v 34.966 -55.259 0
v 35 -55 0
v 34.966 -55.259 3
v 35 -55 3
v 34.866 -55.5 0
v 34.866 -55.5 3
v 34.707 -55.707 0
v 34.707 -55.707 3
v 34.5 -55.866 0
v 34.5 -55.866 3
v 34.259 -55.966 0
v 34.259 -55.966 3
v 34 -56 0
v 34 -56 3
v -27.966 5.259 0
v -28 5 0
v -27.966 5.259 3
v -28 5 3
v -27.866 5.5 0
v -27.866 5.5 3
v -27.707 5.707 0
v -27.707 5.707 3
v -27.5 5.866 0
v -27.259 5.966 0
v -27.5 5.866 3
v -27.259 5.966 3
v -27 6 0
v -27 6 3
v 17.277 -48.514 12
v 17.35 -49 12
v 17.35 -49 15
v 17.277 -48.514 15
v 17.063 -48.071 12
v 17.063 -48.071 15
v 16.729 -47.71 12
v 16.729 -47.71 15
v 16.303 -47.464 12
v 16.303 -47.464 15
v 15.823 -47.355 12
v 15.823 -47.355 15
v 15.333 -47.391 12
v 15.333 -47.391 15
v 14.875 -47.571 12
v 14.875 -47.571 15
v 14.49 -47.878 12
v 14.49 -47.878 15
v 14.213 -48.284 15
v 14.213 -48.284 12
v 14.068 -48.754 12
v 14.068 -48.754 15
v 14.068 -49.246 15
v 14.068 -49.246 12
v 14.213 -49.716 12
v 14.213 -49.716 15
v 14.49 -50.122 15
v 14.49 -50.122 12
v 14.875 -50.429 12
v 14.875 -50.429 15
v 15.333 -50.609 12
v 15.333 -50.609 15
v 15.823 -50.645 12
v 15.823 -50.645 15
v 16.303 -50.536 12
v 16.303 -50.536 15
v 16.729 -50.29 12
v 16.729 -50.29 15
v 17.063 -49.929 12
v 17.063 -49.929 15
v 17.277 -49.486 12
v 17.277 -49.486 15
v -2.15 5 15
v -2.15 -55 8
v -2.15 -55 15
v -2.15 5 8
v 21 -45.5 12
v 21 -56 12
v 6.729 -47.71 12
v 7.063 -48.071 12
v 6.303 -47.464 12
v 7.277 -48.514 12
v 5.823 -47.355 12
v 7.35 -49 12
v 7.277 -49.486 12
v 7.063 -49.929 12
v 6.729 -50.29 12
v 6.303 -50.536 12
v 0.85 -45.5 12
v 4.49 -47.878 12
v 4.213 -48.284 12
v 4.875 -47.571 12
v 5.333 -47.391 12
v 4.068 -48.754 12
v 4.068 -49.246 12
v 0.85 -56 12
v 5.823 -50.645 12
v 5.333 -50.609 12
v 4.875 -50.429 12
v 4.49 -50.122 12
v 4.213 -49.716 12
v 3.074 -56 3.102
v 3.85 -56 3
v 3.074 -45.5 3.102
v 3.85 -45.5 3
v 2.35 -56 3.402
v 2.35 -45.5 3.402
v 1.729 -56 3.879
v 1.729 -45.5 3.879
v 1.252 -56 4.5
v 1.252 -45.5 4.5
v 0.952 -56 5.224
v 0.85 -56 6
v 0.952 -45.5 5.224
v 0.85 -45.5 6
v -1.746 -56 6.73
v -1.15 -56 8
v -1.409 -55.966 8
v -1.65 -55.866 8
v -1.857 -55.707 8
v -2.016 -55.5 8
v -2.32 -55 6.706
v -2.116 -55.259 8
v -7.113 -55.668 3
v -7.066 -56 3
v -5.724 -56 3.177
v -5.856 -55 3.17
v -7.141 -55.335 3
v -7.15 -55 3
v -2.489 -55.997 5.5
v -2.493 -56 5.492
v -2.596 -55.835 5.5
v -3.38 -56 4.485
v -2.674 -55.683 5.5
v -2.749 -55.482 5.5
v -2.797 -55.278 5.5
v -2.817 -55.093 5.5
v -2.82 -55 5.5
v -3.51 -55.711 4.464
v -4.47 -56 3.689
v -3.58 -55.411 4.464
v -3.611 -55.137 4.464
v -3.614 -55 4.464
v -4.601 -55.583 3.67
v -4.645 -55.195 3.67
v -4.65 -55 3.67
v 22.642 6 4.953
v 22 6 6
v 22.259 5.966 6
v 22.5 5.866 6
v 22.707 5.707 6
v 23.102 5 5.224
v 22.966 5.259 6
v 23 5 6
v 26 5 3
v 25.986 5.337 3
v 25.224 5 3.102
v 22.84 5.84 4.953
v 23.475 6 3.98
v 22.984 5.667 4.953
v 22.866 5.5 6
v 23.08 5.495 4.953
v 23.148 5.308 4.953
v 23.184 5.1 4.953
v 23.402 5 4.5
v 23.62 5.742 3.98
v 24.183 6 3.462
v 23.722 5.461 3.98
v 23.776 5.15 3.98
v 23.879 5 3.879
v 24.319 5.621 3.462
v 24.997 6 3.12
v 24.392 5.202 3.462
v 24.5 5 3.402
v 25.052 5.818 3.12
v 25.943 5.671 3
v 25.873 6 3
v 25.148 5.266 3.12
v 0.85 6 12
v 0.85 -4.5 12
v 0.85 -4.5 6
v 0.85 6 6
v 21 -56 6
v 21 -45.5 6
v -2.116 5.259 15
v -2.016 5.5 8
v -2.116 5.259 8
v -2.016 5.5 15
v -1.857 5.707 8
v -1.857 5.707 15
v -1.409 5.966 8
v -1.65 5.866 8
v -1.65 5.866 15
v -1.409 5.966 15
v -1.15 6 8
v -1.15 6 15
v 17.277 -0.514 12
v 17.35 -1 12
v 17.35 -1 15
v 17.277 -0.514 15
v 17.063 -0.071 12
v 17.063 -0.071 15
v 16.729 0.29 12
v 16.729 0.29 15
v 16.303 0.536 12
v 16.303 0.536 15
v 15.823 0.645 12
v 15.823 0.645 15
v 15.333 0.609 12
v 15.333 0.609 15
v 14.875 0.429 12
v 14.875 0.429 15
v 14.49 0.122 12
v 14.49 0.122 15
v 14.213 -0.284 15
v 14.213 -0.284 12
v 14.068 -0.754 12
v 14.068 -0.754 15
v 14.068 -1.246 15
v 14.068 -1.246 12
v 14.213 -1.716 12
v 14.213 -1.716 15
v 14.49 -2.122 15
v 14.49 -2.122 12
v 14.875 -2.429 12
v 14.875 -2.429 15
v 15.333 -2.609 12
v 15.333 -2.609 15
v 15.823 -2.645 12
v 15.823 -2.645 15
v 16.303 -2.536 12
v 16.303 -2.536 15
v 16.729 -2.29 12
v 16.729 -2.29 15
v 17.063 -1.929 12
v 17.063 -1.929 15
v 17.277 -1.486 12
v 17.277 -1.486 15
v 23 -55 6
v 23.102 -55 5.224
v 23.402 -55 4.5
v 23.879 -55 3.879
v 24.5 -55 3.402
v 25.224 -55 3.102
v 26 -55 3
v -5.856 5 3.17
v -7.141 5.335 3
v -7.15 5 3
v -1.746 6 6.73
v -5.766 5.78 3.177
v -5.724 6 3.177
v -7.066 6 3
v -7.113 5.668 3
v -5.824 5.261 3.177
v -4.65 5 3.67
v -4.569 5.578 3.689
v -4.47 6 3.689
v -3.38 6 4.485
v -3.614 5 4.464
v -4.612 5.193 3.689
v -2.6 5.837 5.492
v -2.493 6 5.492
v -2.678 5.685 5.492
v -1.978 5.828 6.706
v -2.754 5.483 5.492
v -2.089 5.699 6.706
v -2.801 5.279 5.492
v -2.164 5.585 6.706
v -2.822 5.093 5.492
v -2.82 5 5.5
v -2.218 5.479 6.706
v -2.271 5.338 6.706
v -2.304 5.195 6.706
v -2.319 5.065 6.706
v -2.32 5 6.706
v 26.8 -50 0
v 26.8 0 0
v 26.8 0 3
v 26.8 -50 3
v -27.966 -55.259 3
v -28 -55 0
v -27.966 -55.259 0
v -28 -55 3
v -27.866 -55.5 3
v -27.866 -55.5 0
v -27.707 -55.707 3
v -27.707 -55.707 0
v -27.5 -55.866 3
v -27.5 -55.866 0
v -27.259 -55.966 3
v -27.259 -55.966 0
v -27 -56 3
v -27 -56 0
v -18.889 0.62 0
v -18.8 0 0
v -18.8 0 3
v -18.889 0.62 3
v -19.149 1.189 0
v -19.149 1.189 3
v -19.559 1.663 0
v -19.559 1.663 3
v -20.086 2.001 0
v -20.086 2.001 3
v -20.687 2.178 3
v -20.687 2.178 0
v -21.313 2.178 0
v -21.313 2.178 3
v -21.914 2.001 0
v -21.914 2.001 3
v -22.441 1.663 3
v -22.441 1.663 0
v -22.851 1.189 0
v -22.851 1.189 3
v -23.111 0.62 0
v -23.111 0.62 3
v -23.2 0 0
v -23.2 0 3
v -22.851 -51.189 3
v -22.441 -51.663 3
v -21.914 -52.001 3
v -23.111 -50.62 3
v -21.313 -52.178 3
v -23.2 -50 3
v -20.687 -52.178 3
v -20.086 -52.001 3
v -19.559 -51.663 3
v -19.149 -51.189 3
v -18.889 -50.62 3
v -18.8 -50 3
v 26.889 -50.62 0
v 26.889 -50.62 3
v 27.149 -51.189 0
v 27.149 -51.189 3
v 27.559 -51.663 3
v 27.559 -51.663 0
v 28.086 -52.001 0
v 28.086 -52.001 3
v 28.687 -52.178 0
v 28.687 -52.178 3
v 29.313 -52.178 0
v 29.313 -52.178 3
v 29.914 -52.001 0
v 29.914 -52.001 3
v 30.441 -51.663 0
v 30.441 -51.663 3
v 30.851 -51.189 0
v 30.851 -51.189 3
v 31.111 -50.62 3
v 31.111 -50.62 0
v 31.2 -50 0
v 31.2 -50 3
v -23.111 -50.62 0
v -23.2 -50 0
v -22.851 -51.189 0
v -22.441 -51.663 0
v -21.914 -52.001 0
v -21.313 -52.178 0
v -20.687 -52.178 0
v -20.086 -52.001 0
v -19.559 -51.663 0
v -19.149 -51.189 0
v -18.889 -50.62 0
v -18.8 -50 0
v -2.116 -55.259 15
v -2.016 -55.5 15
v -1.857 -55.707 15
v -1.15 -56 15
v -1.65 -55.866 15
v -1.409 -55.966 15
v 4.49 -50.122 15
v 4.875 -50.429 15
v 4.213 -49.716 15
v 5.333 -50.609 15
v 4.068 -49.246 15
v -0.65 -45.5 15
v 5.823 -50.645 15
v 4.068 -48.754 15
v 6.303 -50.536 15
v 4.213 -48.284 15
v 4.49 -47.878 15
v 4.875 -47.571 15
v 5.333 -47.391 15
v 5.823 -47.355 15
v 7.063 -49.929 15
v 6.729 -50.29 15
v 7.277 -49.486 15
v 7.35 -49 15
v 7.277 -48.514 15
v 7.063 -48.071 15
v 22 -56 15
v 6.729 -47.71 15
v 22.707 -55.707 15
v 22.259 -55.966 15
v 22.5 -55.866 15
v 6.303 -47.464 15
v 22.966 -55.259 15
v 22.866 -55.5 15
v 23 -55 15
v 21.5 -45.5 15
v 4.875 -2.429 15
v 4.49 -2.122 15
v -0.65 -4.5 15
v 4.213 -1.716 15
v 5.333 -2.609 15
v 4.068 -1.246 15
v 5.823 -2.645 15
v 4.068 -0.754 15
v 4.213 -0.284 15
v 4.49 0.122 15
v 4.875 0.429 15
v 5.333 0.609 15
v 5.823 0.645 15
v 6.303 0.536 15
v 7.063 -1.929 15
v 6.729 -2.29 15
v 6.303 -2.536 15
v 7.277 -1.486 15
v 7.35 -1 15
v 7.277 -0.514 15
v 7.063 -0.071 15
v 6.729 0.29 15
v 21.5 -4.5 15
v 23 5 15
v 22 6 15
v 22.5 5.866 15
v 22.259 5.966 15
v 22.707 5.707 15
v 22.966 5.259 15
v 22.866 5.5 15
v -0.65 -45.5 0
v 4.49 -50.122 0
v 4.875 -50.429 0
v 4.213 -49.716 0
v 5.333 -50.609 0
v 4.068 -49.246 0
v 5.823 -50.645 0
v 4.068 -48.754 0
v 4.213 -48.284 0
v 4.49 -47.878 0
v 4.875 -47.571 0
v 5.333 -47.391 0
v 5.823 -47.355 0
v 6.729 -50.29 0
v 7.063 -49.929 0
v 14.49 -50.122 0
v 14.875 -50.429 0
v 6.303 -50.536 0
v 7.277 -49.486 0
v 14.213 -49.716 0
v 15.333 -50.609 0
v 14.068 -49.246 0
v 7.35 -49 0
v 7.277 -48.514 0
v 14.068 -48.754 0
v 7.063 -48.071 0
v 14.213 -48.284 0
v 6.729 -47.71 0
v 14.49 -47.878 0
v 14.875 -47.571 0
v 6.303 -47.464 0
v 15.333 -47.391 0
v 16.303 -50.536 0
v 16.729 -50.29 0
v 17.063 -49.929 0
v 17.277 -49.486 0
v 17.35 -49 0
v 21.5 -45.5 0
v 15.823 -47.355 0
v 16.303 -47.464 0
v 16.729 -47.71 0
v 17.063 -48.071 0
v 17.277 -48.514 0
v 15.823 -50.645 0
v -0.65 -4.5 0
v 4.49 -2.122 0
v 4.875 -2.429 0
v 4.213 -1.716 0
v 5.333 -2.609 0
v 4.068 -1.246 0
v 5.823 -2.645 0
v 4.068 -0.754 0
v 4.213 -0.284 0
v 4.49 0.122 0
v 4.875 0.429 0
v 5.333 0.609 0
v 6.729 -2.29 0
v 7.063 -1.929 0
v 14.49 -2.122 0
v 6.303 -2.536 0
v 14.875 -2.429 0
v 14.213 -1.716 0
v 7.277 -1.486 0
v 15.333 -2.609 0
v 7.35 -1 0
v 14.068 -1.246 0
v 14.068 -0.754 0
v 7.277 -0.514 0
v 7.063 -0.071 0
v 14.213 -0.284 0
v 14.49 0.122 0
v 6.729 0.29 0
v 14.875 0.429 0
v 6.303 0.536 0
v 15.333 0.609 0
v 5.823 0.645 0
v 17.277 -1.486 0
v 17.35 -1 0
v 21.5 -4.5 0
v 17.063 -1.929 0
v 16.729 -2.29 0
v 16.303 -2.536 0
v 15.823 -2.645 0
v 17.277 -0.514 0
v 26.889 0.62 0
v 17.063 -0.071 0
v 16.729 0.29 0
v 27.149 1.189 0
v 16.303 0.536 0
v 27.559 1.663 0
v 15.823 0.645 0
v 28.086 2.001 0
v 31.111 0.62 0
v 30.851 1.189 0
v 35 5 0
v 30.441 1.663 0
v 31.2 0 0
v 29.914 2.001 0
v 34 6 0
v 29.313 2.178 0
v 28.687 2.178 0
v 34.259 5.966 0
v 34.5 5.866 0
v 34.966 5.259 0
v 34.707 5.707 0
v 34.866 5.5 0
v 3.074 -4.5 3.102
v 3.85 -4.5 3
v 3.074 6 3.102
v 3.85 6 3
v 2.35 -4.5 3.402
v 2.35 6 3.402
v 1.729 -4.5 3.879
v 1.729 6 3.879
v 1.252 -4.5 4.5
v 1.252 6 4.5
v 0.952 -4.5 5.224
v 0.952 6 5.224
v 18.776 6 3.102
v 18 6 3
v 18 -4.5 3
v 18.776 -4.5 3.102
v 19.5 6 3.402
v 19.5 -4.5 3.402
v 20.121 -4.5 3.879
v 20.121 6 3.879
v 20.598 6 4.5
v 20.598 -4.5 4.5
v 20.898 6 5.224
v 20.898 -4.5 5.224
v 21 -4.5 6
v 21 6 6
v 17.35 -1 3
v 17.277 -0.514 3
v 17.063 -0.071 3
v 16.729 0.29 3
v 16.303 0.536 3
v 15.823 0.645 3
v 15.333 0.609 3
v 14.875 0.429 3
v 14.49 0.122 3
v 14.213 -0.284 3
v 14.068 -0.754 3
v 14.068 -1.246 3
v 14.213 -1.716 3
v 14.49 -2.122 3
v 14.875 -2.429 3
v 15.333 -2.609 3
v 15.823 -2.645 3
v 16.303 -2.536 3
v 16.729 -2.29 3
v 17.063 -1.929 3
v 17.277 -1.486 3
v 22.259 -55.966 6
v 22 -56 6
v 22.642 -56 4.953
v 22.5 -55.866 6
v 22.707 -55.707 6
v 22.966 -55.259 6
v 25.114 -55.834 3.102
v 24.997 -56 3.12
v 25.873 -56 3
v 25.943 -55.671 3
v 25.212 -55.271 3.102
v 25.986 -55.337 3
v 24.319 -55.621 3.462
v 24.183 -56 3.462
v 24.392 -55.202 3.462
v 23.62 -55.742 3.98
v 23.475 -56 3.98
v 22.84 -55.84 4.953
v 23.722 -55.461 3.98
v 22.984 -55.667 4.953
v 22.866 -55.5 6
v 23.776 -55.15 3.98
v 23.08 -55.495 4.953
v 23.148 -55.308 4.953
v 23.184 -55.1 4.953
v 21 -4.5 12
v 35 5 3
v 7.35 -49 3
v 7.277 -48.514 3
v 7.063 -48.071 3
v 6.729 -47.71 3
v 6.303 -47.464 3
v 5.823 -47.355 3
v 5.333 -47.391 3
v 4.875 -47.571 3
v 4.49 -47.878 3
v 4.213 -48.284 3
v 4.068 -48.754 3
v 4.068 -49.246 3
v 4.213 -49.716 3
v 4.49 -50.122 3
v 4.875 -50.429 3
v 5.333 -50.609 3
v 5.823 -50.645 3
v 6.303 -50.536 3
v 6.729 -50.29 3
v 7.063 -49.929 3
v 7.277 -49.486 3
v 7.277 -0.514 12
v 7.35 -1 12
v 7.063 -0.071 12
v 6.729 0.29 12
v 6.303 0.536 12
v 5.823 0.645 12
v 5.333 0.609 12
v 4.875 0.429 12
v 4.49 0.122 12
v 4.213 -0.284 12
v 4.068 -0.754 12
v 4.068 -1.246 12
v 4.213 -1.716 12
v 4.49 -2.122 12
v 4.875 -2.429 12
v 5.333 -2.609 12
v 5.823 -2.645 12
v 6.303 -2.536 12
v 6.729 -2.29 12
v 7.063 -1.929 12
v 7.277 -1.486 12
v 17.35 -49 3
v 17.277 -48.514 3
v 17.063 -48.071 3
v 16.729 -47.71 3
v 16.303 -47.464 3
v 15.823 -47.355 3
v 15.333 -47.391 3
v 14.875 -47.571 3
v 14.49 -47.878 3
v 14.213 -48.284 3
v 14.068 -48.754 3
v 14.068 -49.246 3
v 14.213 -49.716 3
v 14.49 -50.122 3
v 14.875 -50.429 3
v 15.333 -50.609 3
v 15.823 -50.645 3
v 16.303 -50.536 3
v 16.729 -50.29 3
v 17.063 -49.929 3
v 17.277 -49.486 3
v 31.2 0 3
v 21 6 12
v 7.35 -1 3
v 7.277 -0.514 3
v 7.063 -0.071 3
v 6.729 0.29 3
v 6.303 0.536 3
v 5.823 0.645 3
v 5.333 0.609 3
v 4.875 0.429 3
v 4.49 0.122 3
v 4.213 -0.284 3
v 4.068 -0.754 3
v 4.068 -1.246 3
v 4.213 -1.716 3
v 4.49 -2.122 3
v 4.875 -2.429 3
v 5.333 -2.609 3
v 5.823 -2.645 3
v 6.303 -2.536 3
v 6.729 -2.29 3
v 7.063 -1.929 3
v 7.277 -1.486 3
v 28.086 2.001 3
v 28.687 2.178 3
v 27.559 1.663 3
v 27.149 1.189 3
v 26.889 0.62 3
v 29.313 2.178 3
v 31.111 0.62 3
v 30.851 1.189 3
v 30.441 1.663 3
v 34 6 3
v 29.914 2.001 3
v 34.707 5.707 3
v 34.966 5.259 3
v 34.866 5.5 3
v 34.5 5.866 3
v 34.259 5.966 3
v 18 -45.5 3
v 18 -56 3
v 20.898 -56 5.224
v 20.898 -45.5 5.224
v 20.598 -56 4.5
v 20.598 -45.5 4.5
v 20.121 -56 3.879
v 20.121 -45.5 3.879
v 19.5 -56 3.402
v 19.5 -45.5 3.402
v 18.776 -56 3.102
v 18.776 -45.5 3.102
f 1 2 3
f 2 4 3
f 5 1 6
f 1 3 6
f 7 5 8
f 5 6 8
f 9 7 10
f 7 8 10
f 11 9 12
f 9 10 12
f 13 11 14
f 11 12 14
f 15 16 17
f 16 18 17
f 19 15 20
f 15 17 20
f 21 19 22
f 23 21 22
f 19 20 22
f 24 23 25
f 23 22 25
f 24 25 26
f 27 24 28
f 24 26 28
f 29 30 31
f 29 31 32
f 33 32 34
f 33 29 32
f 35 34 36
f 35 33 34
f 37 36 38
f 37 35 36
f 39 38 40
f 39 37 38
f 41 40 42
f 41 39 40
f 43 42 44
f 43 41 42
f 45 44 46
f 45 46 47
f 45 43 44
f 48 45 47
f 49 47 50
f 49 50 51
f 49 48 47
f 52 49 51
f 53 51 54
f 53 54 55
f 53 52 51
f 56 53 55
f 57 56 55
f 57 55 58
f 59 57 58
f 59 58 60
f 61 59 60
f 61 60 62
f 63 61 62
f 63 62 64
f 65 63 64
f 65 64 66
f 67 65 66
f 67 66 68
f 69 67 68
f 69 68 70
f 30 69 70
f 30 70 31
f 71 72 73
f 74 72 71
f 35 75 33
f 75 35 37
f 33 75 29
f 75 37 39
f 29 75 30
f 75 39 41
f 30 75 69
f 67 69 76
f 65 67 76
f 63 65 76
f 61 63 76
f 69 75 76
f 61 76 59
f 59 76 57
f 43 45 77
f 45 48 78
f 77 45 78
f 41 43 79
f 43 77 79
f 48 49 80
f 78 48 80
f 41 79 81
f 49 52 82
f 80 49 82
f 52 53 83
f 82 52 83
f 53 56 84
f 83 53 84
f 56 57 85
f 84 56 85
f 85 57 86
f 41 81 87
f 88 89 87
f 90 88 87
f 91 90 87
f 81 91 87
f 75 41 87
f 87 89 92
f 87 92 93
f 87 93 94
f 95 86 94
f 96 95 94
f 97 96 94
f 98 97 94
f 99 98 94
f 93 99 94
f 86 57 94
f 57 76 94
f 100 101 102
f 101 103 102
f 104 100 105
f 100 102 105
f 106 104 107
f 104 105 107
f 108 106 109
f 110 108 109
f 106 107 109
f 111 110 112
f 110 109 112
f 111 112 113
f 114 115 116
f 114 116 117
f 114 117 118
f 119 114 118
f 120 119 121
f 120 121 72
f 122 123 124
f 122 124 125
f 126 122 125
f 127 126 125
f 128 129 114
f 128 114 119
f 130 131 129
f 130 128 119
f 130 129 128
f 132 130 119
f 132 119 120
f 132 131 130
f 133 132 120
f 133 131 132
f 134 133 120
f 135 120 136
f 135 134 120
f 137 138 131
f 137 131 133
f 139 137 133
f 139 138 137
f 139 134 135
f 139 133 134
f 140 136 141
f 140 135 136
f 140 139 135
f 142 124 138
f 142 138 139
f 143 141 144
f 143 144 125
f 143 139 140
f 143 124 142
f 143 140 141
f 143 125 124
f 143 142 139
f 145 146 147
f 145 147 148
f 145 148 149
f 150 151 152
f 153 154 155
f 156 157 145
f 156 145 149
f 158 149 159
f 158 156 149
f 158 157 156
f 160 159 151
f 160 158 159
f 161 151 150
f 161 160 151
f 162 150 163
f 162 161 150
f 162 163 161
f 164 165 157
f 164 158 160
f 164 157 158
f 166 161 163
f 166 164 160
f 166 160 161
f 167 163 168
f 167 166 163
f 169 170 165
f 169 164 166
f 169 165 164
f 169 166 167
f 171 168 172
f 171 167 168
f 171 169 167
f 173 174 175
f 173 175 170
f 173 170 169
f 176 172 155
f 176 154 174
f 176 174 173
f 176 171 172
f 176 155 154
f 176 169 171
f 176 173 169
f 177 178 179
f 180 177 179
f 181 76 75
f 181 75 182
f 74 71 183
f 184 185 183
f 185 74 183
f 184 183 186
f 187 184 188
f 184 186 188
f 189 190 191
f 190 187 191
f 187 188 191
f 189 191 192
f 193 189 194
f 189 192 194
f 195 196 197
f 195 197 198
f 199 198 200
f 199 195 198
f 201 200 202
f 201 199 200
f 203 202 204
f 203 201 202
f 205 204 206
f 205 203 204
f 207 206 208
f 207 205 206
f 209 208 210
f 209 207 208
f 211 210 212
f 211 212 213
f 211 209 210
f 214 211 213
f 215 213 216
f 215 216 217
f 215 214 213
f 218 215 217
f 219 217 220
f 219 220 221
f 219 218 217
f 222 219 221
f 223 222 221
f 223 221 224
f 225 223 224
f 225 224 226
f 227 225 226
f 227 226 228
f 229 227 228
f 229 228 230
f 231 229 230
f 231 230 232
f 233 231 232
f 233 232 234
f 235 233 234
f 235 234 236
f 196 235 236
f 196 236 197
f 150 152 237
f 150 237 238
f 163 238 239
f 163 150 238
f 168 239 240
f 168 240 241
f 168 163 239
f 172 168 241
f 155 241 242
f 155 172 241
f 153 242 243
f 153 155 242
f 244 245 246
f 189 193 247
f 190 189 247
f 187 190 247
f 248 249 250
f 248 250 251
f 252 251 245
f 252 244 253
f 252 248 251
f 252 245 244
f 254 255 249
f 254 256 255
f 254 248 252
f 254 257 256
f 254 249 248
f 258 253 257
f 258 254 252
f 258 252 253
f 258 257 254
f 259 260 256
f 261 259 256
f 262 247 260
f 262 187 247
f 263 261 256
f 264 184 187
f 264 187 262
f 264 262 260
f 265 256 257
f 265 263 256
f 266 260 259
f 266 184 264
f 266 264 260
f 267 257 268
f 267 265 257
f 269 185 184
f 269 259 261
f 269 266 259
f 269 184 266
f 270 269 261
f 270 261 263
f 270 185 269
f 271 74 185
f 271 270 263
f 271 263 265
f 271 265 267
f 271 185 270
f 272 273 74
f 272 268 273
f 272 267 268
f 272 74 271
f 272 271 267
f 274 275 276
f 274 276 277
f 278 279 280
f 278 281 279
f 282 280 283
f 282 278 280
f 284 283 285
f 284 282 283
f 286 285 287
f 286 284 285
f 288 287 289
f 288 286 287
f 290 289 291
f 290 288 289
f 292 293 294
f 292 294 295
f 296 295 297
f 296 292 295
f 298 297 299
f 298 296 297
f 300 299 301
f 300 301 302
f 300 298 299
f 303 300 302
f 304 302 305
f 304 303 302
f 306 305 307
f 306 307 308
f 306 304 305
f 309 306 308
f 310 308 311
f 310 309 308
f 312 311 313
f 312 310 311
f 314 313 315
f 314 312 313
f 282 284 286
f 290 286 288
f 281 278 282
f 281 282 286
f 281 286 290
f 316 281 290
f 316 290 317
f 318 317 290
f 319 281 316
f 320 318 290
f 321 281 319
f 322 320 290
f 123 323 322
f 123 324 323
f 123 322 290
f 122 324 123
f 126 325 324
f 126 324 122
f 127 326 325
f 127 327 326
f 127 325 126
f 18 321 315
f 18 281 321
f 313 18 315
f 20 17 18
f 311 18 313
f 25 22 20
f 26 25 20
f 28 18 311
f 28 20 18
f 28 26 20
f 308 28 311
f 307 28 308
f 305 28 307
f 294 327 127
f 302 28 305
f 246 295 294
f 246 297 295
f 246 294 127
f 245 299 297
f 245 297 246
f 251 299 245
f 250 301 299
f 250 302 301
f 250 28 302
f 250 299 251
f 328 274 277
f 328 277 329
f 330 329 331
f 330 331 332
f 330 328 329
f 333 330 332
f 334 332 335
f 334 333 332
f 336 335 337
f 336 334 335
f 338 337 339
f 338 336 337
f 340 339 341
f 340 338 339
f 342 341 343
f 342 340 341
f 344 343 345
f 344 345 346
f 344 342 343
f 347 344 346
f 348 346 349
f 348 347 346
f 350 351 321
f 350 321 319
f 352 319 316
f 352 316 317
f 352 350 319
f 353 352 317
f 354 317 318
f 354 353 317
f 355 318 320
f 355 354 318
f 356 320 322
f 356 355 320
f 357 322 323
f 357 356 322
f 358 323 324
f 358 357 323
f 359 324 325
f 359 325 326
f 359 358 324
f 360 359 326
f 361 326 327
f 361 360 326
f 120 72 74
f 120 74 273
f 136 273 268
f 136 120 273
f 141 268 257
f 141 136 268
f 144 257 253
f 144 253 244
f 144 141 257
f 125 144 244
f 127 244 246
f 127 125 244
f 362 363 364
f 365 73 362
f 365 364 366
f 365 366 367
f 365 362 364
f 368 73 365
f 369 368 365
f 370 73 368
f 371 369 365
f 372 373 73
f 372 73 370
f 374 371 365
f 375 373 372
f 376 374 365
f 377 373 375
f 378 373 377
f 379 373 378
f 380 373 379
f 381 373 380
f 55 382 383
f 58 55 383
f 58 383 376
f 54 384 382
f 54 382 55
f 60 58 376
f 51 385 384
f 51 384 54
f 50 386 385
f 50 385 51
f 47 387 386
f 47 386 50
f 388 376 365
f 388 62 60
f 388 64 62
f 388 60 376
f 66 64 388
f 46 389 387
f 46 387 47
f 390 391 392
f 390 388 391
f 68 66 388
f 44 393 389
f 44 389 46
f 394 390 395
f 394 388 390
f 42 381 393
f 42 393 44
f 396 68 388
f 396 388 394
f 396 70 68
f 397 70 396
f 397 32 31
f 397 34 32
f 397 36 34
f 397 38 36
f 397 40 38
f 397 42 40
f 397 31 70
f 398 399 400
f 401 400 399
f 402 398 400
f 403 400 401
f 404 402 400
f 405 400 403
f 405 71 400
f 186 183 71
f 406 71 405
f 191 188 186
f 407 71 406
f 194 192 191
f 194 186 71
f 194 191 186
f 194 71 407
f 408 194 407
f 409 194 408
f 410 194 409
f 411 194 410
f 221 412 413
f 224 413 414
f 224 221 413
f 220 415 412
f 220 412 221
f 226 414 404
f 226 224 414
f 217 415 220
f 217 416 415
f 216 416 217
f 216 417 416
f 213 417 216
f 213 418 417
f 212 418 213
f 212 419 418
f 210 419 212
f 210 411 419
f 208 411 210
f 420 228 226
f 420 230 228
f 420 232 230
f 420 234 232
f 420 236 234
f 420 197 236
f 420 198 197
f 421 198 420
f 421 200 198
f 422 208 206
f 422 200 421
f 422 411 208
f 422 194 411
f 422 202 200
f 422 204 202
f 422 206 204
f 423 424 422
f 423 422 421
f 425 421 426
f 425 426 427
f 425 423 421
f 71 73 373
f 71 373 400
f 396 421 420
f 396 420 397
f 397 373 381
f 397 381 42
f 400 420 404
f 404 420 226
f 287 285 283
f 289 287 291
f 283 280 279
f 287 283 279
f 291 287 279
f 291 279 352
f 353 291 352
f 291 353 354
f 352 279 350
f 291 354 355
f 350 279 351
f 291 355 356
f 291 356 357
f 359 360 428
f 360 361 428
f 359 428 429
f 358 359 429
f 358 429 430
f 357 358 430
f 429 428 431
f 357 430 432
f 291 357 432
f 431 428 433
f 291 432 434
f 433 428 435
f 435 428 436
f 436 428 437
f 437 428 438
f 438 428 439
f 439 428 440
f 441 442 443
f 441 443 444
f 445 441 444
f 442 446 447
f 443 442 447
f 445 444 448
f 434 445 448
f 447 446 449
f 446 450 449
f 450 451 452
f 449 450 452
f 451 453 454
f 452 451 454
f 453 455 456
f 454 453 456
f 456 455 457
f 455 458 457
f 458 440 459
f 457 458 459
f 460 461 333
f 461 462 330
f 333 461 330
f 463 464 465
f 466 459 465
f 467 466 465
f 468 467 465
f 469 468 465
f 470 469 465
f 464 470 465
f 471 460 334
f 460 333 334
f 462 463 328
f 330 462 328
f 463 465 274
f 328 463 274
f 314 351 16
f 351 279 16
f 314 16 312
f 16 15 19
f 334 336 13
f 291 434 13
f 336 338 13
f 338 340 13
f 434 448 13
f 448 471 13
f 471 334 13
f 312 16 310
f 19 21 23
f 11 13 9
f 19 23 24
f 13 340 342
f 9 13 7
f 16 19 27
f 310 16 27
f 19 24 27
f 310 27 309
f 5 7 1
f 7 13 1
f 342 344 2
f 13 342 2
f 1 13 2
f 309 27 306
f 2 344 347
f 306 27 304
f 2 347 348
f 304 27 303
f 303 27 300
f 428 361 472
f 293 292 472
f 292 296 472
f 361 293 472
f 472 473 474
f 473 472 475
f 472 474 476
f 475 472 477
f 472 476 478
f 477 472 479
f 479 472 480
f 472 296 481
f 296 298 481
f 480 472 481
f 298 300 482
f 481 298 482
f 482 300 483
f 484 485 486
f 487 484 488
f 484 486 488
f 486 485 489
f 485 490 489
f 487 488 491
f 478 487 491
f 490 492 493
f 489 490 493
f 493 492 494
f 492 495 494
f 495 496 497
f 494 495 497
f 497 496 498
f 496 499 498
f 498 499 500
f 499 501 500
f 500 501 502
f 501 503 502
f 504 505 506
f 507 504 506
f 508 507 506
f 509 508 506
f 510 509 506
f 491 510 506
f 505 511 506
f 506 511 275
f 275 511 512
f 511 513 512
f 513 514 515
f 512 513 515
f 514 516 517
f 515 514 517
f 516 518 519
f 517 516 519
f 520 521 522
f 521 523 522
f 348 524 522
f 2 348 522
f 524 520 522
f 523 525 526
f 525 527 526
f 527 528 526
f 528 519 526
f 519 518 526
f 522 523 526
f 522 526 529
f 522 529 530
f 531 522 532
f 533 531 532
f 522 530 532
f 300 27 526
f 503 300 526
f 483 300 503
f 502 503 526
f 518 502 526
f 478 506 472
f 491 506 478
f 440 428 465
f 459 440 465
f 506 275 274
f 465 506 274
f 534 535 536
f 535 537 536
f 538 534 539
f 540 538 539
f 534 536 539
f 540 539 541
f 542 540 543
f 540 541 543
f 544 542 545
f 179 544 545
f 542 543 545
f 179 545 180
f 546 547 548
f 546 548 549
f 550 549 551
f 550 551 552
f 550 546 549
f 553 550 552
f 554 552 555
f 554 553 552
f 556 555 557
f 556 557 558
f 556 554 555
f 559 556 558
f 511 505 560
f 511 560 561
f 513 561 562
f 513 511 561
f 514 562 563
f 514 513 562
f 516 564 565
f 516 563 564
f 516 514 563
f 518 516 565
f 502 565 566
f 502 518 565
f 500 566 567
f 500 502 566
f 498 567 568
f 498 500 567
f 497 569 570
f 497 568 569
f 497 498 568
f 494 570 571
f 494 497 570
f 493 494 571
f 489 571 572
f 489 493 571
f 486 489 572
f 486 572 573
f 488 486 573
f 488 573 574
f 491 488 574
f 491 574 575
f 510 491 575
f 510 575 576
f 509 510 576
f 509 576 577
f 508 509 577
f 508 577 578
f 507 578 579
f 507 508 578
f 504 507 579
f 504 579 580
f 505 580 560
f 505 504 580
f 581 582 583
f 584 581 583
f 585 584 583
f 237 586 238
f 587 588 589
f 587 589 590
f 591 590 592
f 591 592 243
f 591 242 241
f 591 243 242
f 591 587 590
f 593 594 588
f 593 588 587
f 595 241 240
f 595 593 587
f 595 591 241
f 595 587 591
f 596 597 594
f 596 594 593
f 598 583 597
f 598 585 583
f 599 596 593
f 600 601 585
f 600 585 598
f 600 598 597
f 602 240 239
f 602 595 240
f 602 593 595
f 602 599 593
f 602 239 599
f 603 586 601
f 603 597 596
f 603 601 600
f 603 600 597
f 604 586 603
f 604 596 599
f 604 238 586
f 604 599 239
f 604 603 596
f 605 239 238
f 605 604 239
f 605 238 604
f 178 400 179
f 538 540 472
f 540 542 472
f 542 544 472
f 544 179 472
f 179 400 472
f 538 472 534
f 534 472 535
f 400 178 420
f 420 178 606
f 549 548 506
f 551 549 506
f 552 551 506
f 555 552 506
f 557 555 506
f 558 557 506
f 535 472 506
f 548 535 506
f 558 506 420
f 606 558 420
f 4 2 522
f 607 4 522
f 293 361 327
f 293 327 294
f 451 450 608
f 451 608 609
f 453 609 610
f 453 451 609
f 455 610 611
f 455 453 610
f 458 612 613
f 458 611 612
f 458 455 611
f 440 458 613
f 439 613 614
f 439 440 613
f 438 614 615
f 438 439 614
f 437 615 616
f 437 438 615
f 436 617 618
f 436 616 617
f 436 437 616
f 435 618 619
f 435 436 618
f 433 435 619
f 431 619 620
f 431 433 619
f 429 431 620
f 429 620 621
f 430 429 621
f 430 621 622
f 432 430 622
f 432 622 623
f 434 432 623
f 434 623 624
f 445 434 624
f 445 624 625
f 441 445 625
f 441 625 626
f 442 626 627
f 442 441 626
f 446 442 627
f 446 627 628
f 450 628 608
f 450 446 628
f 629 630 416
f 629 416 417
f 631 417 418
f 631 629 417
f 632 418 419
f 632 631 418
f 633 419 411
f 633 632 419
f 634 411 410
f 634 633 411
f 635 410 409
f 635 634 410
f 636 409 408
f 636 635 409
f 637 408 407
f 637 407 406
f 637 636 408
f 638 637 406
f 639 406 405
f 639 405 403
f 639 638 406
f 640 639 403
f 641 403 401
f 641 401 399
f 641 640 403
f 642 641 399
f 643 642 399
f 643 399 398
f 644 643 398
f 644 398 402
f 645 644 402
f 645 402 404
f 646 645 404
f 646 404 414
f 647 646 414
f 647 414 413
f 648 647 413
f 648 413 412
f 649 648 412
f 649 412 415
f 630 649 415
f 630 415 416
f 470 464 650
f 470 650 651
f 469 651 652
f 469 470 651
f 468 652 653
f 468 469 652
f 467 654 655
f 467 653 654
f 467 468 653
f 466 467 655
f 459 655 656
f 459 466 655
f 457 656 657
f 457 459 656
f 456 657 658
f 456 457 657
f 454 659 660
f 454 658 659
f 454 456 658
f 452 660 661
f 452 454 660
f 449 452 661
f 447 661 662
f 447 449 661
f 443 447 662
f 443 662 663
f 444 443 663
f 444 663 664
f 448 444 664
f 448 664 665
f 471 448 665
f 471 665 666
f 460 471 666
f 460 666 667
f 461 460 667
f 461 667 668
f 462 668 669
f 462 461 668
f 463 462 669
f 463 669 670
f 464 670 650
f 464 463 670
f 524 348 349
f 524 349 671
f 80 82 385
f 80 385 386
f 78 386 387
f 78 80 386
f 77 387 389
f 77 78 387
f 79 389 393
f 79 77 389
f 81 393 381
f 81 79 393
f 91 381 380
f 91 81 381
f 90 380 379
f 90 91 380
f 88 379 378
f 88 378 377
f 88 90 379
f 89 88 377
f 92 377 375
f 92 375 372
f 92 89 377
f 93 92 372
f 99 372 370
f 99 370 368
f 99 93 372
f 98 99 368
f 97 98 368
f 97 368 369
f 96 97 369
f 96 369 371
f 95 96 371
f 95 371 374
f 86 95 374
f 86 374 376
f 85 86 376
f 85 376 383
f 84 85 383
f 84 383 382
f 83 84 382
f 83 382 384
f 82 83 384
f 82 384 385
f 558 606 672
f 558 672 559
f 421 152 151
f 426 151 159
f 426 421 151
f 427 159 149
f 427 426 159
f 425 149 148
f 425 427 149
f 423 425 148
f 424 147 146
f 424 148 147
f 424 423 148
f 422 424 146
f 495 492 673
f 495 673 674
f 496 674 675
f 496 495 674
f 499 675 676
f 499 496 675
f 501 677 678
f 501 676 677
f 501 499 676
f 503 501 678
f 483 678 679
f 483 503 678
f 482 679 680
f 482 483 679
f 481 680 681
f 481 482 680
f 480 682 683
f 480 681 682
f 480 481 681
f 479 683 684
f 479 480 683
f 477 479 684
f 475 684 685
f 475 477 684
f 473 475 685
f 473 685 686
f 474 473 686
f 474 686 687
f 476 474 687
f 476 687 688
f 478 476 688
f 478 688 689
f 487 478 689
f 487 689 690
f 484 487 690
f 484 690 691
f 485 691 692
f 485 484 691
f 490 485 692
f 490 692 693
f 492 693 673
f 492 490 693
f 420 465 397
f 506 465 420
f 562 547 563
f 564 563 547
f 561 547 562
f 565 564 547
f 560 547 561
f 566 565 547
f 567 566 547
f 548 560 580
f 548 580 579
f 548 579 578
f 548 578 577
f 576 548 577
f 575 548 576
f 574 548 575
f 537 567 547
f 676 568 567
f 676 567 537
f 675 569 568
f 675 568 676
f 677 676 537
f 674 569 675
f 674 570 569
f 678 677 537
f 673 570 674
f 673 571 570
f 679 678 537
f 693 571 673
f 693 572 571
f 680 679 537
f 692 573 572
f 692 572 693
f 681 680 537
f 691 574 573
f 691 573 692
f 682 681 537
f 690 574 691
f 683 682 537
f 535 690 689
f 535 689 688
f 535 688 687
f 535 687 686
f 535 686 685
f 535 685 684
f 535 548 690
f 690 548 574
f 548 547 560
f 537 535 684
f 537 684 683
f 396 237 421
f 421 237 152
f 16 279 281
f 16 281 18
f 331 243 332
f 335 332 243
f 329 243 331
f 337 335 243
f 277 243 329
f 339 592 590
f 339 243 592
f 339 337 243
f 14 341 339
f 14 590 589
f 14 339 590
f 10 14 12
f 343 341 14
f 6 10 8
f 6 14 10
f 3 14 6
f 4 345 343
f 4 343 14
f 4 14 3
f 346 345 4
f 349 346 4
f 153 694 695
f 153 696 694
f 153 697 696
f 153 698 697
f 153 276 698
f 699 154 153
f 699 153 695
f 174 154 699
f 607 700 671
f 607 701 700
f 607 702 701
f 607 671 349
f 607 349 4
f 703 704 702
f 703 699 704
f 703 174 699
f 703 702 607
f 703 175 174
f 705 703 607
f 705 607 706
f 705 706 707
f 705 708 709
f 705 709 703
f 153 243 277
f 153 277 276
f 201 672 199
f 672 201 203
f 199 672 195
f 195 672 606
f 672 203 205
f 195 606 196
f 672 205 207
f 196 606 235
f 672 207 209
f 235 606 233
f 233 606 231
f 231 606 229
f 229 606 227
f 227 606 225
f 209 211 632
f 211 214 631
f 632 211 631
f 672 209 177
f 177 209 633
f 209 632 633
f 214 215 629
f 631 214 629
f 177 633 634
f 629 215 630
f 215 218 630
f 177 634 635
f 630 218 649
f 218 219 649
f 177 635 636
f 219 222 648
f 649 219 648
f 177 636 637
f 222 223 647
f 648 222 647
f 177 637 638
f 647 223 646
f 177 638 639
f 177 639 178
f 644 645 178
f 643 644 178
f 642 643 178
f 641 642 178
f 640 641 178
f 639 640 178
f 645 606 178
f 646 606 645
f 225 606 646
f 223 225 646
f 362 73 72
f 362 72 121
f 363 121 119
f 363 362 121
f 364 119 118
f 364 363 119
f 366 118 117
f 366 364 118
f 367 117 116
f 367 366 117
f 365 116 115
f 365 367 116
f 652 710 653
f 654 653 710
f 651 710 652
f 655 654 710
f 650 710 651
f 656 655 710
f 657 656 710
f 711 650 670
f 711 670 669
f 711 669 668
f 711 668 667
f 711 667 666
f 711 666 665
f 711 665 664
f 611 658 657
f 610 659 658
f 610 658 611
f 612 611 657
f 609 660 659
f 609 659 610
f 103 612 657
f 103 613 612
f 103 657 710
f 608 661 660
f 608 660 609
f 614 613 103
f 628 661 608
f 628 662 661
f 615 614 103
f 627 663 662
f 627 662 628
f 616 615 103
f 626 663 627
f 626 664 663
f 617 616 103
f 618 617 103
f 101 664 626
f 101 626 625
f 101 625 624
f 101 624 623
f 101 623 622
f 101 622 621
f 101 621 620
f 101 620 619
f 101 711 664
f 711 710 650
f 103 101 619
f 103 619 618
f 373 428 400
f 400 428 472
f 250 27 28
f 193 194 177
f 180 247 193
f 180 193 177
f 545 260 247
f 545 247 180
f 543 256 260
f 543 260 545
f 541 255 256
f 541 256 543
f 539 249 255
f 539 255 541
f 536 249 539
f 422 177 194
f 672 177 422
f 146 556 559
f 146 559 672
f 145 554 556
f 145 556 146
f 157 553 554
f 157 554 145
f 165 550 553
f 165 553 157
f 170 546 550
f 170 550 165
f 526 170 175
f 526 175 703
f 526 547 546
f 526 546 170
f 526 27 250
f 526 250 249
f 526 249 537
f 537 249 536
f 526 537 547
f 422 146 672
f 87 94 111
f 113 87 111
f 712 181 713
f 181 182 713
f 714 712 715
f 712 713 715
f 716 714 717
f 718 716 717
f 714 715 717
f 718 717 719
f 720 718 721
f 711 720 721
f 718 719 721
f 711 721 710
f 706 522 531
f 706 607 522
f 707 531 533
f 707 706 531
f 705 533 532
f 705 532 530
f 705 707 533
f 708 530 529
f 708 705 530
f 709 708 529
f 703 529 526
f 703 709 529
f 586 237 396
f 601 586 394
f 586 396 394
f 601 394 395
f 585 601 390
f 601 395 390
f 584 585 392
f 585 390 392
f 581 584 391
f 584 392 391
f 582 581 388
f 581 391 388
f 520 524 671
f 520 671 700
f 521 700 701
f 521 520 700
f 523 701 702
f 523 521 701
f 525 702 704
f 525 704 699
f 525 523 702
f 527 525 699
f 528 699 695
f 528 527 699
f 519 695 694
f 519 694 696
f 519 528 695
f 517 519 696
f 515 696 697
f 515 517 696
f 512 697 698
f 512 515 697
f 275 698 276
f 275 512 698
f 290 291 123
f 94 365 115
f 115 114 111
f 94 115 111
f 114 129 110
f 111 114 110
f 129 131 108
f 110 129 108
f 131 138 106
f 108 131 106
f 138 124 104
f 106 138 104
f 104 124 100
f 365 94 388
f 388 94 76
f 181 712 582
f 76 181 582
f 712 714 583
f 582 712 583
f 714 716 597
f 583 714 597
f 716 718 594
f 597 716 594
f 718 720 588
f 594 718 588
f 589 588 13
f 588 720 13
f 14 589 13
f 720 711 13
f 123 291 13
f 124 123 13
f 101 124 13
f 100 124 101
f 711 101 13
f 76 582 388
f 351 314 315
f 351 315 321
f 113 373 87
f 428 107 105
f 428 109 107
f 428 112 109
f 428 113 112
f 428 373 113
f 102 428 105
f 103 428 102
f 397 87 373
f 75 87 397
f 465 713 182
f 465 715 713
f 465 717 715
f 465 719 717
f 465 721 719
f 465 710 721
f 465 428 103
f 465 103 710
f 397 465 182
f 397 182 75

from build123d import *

# Parameters (mm, degrees)
SKETCH_1_W          = 63
SKETCH_1_H          = 62
EXTRUDE_1_DEPTH     = 3
SKETCH_2_W          = 25.15
SKETCH_2_H          = 62
SKETCH_2_R          = 1.65
EXTRUDE_2_DEPTH     = 12
CUT_EXTRUDE_START   = -45
SKETCH_4_R          = 1.65
SKETCH_4_W          = 22.15
SKETCH_4_H          = 41
CUT_EXTRUDE_4_DEPTH = 45
FILLET_1_R          = 1
FILLET_2_R          = 5
SKETCH_5_W          = 20.15
SKETCH_5_H          = 9
CUT_EXTRUDE_5_DEPTH = 70
FILLET_3_R          = 3
FILLET_4_R          = 3


with BuildPart() as part:
    # 草图1 → 凸台-拉伸1 (new body)
    with BuildSketch(Plane.XY):
        with Locations((3.5, -25)):
            Rectangle(SKETCH_1_W, SKETCH_1_H)
        with BuildLine():
            Line((26.8, 0), (26.8, -50))
            ThreePointArc((26.8, -50), (29, -52.2), (31.2, -50))
            Line((31.2, -50), (31.2, 0))
            ThreePointArc((31.2, 0), (29, 2.2), (26.8, 0))
        make_face(mode=Mode.SUBTRACT)
        with BuildLine():
            Line((-23.2, 0), (-23.2, -50))
            ThreePointArc((-23.2, -50), (-21, -52.2), (-18.8, -50))
            Line((-18.8, -50), (-18.8, 0))
            ThreePointArc((-18.8, 0), (-21, 2.2), (-23.2, 0))
        make_face(mode=Mode.SUBTRACT)
    extrude(amount=EXTRUDE_1_DEPTH)

    # 草图2 → 凸台-拉伸2 (add)
    with BuildSketch(Plane.XY.offset(3)):
        with Locations((10.425, -25)):
            Rectangle(SKETCH_2_W, SKETCH_2_H)
        with Locations((5.7, -1)):
            Circle(SKETCH_2_R, mode=Mode.SUBTRACT)
        with Locations((15.7, -1)):
            Circle(SKETCH_2_R, mode=Mode.SUBTRACT)
        with Locations((15.7, -49)):
            Circle(SKETCH_2_R, mode=Mode.SUBTRACT)
        with Locations((5.7, -49)):
            Circle(SKETCH_2_R, mode=Mode.SUBTRACT)
    extrude(amount=EXTRUDE_2_DEPTH)

    # 草图4 → 切除-拉伸4 (cut)
    with BuildSketch(Plane.XY.offset(15).offset(CUT_EXTRUDE_START)):
        with Locations((5.7, -1)):
            Circle(SKETCH_4_R)
        with Locations((5.7, -49)):
            Circle(SKETCH_4_R)
        with Locations((15.7, -49)):
            Circle(SKETCH_4_R)
        with Locations((15.7, -1)):
            Circle(SKETCH_4_R)
        with Locations((10.425, -25)):
            Rectangle(SKETCH_4_W, SKETCH_4_H)
    extrude(amount=CUT_EXTRUDE_4_DEPTH, mode=Mode.SUBTRACT)

    # 圆角1
    fillet_1_edges = [part.edges().sort_by_distance(p)[0] for p in [
        (-2.15, 6, 9),
        (-2.15, -56, 9),
        (23, -56, 9),
        (23, 6, 9),
        (-28, 6, 1.5),
        (35, 6, 1.5),
        (35, -56, 1.5),
        (-28, -56, 1.5),
    ]]
    fillet(fillet_1_edges, radius=FILLET_1_R)

    # 圆角2
    # the kernel refuses this fillet: 5 mm, written as the material it adds along each edge
    with BuildSketch(Plane(origin=(-2.15, -55, 3), x_dir=(0, 0, 1), z_dir=(0, 1, 0))) as fillet_2_piece_1:
        with BuildLine():
            CenterArc((FILLET_2_R, -FILLET_2_R), FILLET_2_R, 90, 90)
            Line((0, -FILLET_2_R), (0, 0))
            Line((0, 0), (FILLET_2_R, 0))
        make_face()
    extrude(amount=60)
    with BuildSketch(Plane(origin=(-1.15, 5, 3), x_dir=(-0.9999802608561372, -0.006283143965558402, 0), z_dir=(-0.006283143965558402, 0.9999802608561372, 0))) as fillet_2_piece_2_section:
        with BuildLine():
            CenterArc((-1 - FILLET_2_R, FILLET_2_R), FILLET_2_R, 270, 90)
            Line((-1 - FILLET_2_R, 0), (-1, 0))
            Line((-1, 0), (-1, FILLET_2_R))
        make_face()
    fillet_2_piece_2 = revolve(axis=Axis((-1.15, 5, 3), (0, 0, 1)), revolution_arc=359.64, mode=Mode.PRIVATE)
    fillet_2_piece_2 = split(fillet_2_piece_2, bisect_by=Plane(origin=(-1.917475009, 6, 5.017645476), z_dir=(0, -1, 0)), keep=Keep.TOP, mode=Mode.PRIVATE)
    add(fillet_2_piece_2)
    with BuildSketch(Plane(origin=(-1.15, -55, 3), x_dir=(-0.9999802608561372, 0.006283143965561067, 0), z_dir=(-0.006283143965561067, -0.9999802608561372, 0))) as fillet_2_piece_3_section:
        with BuildLine():
            CenterArc((-1 - FILLET_2_R, -FILLET_2_R), FILLET_2_R, 0, 90)
            Line((-1 - FILLET_2_R, 0), (-1, 0))
            Line((-1, 0), (-1, -FILLET_2_R))
        make_face()
    fillet_2_piece_3 = revolve(axis=Axis((-1.15, -55, 3), (0, 0, -1)), revolution_arc=359.64, mode=Mode.PRIVATE)
    fillet_2_piece_3 = split(fillet_2_piece_3, bisect_by=Plane(origin=(-1.917475041, -56, 5.017645533), z_dir=(0, 1, 0)), keep=Keep.TOP, mode=Mode.PRIVATE)
    add(fillet_2_piece_3)

    # 草图5 → 切除-拉伸5 (cut)
    with BuildSketch(Plane(origin=(0, -56, 0), x_dir=(-1, 0, 0), z_dir=(0, -1, 0))):
        with Locations((-10.925, -7.5)):
            Rectangle(SKETCH_5_W, SKETCH_5_H)
    extrude(amount=-CUT_EXTRUDE_5_DEPTH, mode=Mode.SUBTRACT)

    # 圆角3
    fillet_3_edges = [part.edges().sort_by_distance(p)[0] for p in [
        (0.85, 0.75, 3),
        (0.85, -50.75, 3),
        (21, 0.75, 3),
        (21, -50.75, 3),
    ]]
    fillet(fillet_3_edges, radius=FILLET_3_R)

    # 圆角4
    # the kernel refuses this fillet: 3 mm, written as the material it adds along each edge
    with BuildSketch(Plane(origin=(23, 5, 3), x_dir=(1, 0, 0), z_dir=(0, -1, 0))) as fillet_4_piece_1:
        with BuildLine():
            CenterArc((FILLET_4_R, FILLET_4_R), FILLET_4_R, 180, 90)
            Line((0, FILLET_4_R), (0, 0))
            Line((0, 0), (FILLET_4_R, 0))
        make_face()
    extrude(amount=60)
    with BuildSketch(Plane(origin=(22, 5, 3), x_dir=(0.9999802608561372, -0.0062831439655584, 0), z_dir=(0.0062831439655584, 0.9999802608561372, 0))) as fillet_4_piece_2_section:
        with BuildLine():
            CenterArc((-1 - FILLET_4_R, -FILLET_4_R), FILLET_4_R, 0, 90)
            Line((-1, -FILLET_4_R), (-1, 0))
            Line((-1, 0), (-1 - FILLET_4_R, 0))
        make_face()
    fillet_4_piece_2 = revolve(axis=Axis((22, 5, 3), (0, 0, -1)), revolution_arc=359.64, mode=Mode.PRIVATE)
    fillet_4_piece_2 = split(fillet_4_piece_2, bisect_by=Plane(origin=(22.764056834, 6, 4.135633635), z_dir=(0, -1, 0)), keep=Keep.TOP, mode=Mode.PRIVATE)
    add(fillet_4_piece_2)
    with BuildSketch(Plane(origin=(22, -55, 3), x_dir=(0.9999802608561372, 0.006283143965561065, 0), z_dir=(0.006283143965561065, -0.9999802608561372, 0))) as fillet_4_piece_3_section:
        with BuildLine():
            CenterArc((-1 - FILLET_4_R, FILLET_4_R), FILLET_4_R, 270, 90)
            Line((-1 - FILLET_4_R, 0), (-1, 0))
            Line((-1, 0), (-1, FILLET_4_R))
        make_face()
    fillet_4_piece_3 = revolve(axis=Axis((22, -55, 3), (0, 0, 1)), revolution_arc=359.64, mode=Mode.PRIVATE)
    fillet_4_piece_3 = split(fillet_4_piece_3, bisect_by=Plane(origin=(22.76405677, -56, 4.135633616), z_dir=(0, 1, 0)), keep=Keep.TOP, mode=Mode.PRIVATE)
    add(fillet_4_piece_3)


solid = part.part
